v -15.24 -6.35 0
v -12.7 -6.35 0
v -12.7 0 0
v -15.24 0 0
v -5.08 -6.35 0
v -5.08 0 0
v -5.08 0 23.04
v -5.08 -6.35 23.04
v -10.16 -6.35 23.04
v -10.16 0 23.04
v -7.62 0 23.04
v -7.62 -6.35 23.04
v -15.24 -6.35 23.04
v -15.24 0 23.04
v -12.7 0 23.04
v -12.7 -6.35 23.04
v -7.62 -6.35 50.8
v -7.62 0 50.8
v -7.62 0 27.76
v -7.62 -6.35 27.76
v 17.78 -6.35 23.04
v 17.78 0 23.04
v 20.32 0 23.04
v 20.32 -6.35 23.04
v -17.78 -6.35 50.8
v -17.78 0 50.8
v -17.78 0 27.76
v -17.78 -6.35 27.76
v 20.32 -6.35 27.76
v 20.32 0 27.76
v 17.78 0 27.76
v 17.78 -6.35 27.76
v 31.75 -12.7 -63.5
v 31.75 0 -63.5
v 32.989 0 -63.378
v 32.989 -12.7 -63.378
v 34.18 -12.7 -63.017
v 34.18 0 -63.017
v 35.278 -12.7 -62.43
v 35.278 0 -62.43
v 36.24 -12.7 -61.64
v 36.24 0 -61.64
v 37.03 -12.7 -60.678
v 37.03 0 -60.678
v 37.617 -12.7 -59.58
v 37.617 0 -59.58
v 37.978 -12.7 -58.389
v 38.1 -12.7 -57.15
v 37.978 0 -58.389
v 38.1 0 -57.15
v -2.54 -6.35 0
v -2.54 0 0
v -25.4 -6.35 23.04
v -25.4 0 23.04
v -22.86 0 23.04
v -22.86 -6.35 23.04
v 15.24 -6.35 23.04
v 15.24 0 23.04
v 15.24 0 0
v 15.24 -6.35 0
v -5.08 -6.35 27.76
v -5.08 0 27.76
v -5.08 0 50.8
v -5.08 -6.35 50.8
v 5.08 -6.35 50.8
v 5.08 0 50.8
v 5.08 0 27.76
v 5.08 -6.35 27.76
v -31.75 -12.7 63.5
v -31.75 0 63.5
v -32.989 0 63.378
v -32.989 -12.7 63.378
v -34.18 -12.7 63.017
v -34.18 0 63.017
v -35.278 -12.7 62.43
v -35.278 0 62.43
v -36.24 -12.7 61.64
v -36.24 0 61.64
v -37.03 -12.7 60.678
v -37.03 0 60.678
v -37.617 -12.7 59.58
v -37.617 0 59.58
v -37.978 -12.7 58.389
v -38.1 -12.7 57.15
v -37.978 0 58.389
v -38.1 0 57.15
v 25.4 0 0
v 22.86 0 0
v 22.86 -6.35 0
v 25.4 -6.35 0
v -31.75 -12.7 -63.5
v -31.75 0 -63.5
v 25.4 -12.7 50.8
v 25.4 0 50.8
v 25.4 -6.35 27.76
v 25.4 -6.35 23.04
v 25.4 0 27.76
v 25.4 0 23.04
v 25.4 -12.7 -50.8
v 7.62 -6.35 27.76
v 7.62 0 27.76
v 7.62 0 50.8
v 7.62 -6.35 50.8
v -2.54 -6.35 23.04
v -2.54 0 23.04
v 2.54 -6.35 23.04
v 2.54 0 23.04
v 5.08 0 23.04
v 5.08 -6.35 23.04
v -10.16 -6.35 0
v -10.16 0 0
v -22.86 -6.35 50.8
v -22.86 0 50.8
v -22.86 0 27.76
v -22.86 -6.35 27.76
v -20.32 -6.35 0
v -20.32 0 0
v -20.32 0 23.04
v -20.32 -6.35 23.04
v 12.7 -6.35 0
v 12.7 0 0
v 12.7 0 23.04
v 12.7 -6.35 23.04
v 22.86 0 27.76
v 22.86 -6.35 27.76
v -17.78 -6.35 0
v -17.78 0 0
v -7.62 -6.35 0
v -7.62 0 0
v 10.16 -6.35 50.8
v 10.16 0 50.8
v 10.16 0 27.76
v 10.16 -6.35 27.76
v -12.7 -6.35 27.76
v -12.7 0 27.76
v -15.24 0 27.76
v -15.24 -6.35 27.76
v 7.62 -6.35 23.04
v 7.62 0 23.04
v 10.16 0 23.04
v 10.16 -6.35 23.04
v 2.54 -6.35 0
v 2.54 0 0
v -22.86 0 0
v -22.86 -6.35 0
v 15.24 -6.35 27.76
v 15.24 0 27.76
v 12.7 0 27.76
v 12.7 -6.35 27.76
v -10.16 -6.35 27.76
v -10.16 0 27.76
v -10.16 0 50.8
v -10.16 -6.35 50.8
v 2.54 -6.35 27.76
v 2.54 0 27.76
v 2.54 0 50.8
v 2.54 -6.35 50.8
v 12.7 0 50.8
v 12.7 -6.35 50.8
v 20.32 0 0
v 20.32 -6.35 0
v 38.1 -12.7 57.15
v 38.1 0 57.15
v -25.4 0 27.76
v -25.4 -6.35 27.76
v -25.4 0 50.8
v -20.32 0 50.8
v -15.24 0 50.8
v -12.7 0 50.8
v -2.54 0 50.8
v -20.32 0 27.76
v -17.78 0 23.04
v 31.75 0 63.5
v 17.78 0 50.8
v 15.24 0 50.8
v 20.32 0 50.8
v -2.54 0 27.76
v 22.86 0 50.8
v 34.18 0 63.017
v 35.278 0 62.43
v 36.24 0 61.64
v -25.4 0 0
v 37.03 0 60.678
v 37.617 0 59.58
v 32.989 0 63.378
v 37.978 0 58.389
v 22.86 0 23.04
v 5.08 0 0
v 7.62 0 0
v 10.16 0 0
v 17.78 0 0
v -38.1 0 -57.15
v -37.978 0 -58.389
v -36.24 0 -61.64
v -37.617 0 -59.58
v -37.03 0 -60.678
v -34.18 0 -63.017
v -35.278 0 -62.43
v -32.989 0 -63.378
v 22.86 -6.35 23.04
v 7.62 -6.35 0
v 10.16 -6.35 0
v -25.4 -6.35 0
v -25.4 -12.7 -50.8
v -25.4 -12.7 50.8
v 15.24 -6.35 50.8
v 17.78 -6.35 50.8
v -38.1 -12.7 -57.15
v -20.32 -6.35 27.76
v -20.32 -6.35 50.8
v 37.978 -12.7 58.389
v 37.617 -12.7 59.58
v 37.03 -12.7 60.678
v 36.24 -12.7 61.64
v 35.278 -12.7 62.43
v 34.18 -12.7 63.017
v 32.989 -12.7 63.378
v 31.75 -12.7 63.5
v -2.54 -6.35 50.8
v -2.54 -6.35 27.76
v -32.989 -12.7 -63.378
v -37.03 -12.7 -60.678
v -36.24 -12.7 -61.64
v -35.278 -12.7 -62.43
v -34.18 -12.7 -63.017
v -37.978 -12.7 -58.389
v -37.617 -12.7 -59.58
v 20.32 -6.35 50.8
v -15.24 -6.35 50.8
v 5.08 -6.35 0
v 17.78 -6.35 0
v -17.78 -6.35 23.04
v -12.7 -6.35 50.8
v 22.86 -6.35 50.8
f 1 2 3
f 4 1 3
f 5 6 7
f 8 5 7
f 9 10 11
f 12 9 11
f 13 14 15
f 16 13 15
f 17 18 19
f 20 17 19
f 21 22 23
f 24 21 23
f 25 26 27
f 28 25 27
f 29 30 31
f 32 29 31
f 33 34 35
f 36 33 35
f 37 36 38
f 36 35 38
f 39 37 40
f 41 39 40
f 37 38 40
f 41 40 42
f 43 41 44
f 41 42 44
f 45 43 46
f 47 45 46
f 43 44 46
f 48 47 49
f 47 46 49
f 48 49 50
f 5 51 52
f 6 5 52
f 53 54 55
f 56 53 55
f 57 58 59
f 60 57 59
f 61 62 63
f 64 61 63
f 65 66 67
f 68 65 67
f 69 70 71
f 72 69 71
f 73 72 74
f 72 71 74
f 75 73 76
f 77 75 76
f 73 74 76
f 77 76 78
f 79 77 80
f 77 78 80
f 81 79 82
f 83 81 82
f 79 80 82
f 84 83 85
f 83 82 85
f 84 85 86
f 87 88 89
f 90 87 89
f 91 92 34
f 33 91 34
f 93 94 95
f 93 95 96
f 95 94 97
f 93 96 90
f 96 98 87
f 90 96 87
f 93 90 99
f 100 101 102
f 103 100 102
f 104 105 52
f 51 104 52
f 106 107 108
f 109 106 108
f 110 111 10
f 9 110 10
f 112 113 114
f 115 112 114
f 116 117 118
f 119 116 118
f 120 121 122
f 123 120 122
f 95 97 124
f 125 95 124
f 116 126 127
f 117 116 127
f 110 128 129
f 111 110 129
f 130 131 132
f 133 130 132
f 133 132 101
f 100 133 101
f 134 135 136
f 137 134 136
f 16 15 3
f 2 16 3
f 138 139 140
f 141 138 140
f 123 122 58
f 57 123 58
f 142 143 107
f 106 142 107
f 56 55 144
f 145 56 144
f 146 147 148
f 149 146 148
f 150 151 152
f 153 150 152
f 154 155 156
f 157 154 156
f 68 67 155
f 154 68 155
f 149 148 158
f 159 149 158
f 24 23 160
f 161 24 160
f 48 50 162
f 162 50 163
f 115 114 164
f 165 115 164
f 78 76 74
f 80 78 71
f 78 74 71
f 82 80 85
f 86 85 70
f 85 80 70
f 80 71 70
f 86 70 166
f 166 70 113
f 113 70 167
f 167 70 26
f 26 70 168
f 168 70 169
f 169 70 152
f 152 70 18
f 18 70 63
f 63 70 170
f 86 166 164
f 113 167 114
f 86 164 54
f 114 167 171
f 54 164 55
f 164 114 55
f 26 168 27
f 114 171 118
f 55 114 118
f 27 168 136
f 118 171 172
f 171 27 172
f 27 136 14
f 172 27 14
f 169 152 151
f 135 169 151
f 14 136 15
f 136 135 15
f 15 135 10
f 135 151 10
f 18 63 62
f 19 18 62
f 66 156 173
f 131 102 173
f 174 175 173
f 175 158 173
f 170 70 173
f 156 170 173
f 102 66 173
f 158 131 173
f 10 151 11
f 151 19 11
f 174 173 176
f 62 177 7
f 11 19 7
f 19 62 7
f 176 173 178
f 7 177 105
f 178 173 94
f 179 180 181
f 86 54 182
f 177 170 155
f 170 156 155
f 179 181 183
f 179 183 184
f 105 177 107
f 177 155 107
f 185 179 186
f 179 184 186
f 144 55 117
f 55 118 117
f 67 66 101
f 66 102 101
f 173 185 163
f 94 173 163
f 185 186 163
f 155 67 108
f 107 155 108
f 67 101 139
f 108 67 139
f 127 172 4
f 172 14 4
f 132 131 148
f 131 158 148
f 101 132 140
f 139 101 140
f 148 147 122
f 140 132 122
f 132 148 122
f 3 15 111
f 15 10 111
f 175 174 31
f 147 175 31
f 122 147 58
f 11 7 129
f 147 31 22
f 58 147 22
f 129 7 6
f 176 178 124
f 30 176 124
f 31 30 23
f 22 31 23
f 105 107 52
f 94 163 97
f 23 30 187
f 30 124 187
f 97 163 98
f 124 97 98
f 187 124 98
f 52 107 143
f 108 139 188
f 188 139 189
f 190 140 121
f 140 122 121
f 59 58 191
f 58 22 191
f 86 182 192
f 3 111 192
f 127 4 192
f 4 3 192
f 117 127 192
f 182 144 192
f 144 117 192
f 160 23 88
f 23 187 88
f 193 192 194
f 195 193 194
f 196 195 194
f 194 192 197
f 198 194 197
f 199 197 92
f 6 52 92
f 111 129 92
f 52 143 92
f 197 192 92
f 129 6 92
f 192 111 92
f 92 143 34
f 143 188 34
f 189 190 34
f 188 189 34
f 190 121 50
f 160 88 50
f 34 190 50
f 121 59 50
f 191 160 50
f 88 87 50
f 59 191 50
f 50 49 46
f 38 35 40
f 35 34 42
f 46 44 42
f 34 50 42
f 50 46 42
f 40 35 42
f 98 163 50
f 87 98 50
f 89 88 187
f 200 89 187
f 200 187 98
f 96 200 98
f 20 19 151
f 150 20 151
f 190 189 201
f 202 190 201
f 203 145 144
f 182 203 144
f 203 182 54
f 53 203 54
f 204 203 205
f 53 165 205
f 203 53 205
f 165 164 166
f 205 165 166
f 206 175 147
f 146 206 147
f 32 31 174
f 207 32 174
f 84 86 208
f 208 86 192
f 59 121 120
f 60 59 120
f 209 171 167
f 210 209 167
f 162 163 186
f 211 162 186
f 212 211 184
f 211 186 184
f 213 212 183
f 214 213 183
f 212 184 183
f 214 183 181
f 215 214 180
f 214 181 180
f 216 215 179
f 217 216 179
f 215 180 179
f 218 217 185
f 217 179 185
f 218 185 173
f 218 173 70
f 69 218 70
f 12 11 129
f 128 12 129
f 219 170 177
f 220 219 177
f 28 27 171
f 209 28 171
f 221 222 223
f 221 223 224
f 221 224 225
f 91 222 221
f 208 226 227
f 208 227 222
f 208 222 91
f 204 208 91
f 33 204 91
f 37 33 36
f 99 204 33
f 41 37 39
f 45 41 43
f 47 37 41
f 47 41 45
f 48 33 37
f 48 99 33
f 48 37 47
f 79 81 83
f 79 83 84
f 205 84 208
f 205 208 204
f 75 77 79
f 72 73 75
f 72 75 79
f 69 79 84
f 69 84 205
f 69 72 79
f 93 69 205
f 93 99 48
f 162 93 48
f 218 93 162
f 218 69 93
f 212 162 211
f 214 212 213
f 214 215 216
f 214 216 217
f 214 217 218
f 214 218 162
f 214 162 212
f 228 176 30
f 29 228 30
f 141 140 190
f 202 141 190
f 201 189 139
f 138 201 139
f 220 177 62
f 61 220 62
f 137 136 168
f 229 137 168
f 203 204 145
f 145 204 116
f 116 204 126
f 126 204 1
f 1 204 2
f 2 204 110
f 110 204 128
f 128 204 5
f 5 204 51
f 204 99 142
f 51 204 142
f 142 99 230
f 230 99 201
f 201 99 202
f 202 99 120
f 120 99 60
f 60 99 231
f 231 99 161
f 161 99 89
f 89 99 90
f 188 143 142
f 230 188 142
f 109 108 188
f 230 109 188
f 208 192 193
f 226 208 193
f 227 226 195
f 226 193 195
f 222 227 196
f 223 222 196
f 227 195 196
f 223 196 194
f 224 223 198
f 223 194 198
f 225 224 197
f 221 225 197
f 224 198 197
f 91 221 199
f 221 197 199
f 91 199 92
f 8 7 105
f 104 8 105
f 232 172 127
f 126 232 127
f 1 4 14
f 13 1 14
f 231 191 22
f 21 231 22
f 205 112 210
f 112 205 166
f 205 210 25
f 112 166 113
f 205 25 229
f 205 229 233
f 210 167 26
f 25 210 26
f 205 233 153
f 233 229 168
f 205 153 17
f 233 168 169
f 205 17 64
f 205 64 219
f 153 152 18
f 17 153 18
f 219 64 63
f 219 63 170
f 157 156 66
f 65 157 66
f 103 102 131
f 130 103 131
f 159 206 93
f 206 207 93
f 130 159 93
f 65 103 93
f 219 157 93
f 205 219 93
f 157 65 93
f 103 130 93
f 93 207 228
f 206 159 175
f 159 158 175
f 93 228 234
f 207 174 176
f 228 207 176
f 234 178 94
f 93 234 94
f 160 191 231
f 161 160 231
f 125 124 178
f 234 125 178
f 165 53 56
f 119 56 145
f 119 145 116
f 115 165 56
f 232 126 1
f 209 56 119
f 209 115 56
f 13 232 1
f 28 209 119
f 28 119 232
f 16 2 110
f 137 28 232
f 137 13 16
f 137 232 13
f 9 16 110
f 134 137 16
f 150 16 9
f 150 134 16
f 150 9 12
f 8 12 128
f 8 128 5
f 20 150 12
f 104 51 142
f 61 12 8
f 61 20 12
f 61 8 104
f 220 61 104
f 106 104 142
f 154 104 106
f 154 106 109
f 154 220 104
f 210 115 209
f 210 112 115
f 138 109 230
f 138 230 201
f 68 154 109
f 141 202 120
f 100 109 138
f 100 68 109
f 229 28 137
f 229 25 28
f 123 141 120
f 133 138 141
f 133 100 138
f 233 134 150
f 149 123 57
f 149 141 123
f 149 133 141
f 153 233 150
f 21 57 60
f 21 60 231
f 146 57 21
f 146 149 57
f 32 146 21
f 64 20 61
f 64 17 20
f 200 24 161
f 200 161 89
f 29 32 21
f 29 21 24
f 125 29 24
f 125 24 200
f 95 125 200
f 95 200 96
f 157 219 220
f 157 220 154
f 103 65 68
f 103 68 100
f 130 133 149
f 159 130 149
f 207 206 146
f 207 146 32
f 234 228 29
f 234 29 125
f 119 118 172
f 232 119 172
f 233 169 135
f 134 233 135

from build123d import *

# Parameters (mm, degrees)
F1_DEPTH = 12.7
F2_DEPTH = 6.35
F4_DEPTH = 25.4
F5_DEPTH = 25.4


with BuildPart() as f1:
    # F0 (on Front) → F1 (new body)
    with BuildSketch(Plane.XZ):
        with BuildLine():
            ThreePointArc((38.1, 57.15), (36.240128, 61.640128), (31.75, 63.5))
            Line((31.75, 63.5), (-31.75, 63.5))
            ThreePointArc((-31.75, 63.5), (-36.240128, 61.640128), (-38.1, 57.15))
            Line((-38.1, 57.15), (-38.1, -57.15))
            ThreePointArc((-38.1, -57.15), (-36.240128, -61.640128), (-31.75, -63.5))
            Line((-31.75, -63.5), (31.75, -63.5))
            ThreePointArc((31.75, -63.5), (36.240128, -61.640128), (38.1, -57.15))
            Line((38.1, -57.15), (38.1, 57.15))
        make_face()
        Polygon((22.86, 50.8), (25.4, 50.8), (25.4, 27.760267), (25.4, 23.039733), (25.4, 0), (25.4, -50.8), (-25.4, -50.8), (-25.4, 0), (-25.4, 23.039733), (-25.4, 27.760267), (-25.4, 50.8), (-22.86, 50.8), (-20.32, 50.8), (-17.78, 50.8), (-15.24, 50.8), (-12.7, 50.8), (-10.16, 50.8), (-7.62, 50.8), (-5.08, 50.8), (-2.54, 50.8), (0, 50.8), (2.54, 50.8), (5.08, 50.8), (7.62, 50.8), (10.16, 50.8), (12.7, 50.8), (15.24, 50.8), (17.78, 50.8), (20.32, 50.8), align=None, mode=Mode.SUBTRACT)
    extrude(amount=F1_DEPTH)

    # F0 (on Front) → F2 (join)
    with BuildSketch(Plane.XZ):
        Polygon((22.86, 27.760267), (22.86, 50.8), (20.32, 50.8), (20.32, 27.760267), (17.78, 27.760267), (17.78, 50.8), (15.24, 50.8), (15.24, 27.760267), (12.7, 27.760267), (12.7, 50.8), (10.16, 50.8), (10.16, 27.760267), (7.62, 27.760267), (7.62, 50.8), (5.08, 50.8), (5.08, 27.760267), (2.54, 27.760267), (2.54, 50.8), (0, 50.8), (-2.54, 50.8), (-2.54, 27.760267), (-5.08, 27.760267), (-5.08, 50.8), (-7.62, 50.8), (-7.62, 27.760267), (-10.16, 27.760267), (-10.16, 50.8), (-12.7, 50.8), (-12.7, 27.760267), (-15.24, 27.760267), (-15.24, 50.8), (-17.78, 50.8), (-17.78, 27.760267), (-20.32, 27.760267), (-20.32, 50.8), (-22.86, 50.8), (-22.86, 27.760267), (-25.4, 27.760267), (-25.4, 23.039733), (-22.86, 23.039733), (-22.86, 0), (-20.32, 0), (-20.32, 23.039733), (-17.78, 23.039733), (-17.78, 0), (-15.24, 0), (-15.24, 23.039733), (-12.7, 23.039733), (-12.7, 0), (-10.16, 0), (-10.16, 23.039733), (-7.62, 23.039733), (-7.62, 0), (-5.08, 0), (-5.08, 23.039733), (-2.54, 23.039733), (-2.54, 0), (0, 0), (2.54, 0), (2.54, 23.039733), (5.08, 23.039733), (5.08, 0), (7.62, 0), (7.62, 23.039733), (10.16, 23.039733), (10.16, 0), (12.7, 0), (12.7, 23.039733), (15.24, 23.039733), (15.24, 0), (17.78, 0), (17.78, 23.039733), (20.32, 23.039733), (20.32, 0), (22.86, 0), (22.86, 23.039733), (25.4, 23.039733), (25.4, 27.760267), align=None)
    extrude(amount=F2_DEPTH)

    # F3 (on Right) → F4 (join, through all)
    with BuildSketch(Plane.YZ):
        Polygon((0, -50.8), (0, 0), (-6.35, 0), (-12.7, -50.8), align=None)
    extrude(amount=F4_DEPTH)

    # F4_face (on face) → F5 (join, through all)
    with BuildSketch(Plane(origin=(0, -4.938889, -28.222222), x_dir=(0, 1, 0), z_dir=(-1, 0, 0))):
        Polygon((4.938889, -28.222222), (4.938889, 22.577778), (-7.761111, 22.577778), (-1.411111, -28.222222), align=None)
    extrude(amount=F5_DEPTH)


solid = f1.part
